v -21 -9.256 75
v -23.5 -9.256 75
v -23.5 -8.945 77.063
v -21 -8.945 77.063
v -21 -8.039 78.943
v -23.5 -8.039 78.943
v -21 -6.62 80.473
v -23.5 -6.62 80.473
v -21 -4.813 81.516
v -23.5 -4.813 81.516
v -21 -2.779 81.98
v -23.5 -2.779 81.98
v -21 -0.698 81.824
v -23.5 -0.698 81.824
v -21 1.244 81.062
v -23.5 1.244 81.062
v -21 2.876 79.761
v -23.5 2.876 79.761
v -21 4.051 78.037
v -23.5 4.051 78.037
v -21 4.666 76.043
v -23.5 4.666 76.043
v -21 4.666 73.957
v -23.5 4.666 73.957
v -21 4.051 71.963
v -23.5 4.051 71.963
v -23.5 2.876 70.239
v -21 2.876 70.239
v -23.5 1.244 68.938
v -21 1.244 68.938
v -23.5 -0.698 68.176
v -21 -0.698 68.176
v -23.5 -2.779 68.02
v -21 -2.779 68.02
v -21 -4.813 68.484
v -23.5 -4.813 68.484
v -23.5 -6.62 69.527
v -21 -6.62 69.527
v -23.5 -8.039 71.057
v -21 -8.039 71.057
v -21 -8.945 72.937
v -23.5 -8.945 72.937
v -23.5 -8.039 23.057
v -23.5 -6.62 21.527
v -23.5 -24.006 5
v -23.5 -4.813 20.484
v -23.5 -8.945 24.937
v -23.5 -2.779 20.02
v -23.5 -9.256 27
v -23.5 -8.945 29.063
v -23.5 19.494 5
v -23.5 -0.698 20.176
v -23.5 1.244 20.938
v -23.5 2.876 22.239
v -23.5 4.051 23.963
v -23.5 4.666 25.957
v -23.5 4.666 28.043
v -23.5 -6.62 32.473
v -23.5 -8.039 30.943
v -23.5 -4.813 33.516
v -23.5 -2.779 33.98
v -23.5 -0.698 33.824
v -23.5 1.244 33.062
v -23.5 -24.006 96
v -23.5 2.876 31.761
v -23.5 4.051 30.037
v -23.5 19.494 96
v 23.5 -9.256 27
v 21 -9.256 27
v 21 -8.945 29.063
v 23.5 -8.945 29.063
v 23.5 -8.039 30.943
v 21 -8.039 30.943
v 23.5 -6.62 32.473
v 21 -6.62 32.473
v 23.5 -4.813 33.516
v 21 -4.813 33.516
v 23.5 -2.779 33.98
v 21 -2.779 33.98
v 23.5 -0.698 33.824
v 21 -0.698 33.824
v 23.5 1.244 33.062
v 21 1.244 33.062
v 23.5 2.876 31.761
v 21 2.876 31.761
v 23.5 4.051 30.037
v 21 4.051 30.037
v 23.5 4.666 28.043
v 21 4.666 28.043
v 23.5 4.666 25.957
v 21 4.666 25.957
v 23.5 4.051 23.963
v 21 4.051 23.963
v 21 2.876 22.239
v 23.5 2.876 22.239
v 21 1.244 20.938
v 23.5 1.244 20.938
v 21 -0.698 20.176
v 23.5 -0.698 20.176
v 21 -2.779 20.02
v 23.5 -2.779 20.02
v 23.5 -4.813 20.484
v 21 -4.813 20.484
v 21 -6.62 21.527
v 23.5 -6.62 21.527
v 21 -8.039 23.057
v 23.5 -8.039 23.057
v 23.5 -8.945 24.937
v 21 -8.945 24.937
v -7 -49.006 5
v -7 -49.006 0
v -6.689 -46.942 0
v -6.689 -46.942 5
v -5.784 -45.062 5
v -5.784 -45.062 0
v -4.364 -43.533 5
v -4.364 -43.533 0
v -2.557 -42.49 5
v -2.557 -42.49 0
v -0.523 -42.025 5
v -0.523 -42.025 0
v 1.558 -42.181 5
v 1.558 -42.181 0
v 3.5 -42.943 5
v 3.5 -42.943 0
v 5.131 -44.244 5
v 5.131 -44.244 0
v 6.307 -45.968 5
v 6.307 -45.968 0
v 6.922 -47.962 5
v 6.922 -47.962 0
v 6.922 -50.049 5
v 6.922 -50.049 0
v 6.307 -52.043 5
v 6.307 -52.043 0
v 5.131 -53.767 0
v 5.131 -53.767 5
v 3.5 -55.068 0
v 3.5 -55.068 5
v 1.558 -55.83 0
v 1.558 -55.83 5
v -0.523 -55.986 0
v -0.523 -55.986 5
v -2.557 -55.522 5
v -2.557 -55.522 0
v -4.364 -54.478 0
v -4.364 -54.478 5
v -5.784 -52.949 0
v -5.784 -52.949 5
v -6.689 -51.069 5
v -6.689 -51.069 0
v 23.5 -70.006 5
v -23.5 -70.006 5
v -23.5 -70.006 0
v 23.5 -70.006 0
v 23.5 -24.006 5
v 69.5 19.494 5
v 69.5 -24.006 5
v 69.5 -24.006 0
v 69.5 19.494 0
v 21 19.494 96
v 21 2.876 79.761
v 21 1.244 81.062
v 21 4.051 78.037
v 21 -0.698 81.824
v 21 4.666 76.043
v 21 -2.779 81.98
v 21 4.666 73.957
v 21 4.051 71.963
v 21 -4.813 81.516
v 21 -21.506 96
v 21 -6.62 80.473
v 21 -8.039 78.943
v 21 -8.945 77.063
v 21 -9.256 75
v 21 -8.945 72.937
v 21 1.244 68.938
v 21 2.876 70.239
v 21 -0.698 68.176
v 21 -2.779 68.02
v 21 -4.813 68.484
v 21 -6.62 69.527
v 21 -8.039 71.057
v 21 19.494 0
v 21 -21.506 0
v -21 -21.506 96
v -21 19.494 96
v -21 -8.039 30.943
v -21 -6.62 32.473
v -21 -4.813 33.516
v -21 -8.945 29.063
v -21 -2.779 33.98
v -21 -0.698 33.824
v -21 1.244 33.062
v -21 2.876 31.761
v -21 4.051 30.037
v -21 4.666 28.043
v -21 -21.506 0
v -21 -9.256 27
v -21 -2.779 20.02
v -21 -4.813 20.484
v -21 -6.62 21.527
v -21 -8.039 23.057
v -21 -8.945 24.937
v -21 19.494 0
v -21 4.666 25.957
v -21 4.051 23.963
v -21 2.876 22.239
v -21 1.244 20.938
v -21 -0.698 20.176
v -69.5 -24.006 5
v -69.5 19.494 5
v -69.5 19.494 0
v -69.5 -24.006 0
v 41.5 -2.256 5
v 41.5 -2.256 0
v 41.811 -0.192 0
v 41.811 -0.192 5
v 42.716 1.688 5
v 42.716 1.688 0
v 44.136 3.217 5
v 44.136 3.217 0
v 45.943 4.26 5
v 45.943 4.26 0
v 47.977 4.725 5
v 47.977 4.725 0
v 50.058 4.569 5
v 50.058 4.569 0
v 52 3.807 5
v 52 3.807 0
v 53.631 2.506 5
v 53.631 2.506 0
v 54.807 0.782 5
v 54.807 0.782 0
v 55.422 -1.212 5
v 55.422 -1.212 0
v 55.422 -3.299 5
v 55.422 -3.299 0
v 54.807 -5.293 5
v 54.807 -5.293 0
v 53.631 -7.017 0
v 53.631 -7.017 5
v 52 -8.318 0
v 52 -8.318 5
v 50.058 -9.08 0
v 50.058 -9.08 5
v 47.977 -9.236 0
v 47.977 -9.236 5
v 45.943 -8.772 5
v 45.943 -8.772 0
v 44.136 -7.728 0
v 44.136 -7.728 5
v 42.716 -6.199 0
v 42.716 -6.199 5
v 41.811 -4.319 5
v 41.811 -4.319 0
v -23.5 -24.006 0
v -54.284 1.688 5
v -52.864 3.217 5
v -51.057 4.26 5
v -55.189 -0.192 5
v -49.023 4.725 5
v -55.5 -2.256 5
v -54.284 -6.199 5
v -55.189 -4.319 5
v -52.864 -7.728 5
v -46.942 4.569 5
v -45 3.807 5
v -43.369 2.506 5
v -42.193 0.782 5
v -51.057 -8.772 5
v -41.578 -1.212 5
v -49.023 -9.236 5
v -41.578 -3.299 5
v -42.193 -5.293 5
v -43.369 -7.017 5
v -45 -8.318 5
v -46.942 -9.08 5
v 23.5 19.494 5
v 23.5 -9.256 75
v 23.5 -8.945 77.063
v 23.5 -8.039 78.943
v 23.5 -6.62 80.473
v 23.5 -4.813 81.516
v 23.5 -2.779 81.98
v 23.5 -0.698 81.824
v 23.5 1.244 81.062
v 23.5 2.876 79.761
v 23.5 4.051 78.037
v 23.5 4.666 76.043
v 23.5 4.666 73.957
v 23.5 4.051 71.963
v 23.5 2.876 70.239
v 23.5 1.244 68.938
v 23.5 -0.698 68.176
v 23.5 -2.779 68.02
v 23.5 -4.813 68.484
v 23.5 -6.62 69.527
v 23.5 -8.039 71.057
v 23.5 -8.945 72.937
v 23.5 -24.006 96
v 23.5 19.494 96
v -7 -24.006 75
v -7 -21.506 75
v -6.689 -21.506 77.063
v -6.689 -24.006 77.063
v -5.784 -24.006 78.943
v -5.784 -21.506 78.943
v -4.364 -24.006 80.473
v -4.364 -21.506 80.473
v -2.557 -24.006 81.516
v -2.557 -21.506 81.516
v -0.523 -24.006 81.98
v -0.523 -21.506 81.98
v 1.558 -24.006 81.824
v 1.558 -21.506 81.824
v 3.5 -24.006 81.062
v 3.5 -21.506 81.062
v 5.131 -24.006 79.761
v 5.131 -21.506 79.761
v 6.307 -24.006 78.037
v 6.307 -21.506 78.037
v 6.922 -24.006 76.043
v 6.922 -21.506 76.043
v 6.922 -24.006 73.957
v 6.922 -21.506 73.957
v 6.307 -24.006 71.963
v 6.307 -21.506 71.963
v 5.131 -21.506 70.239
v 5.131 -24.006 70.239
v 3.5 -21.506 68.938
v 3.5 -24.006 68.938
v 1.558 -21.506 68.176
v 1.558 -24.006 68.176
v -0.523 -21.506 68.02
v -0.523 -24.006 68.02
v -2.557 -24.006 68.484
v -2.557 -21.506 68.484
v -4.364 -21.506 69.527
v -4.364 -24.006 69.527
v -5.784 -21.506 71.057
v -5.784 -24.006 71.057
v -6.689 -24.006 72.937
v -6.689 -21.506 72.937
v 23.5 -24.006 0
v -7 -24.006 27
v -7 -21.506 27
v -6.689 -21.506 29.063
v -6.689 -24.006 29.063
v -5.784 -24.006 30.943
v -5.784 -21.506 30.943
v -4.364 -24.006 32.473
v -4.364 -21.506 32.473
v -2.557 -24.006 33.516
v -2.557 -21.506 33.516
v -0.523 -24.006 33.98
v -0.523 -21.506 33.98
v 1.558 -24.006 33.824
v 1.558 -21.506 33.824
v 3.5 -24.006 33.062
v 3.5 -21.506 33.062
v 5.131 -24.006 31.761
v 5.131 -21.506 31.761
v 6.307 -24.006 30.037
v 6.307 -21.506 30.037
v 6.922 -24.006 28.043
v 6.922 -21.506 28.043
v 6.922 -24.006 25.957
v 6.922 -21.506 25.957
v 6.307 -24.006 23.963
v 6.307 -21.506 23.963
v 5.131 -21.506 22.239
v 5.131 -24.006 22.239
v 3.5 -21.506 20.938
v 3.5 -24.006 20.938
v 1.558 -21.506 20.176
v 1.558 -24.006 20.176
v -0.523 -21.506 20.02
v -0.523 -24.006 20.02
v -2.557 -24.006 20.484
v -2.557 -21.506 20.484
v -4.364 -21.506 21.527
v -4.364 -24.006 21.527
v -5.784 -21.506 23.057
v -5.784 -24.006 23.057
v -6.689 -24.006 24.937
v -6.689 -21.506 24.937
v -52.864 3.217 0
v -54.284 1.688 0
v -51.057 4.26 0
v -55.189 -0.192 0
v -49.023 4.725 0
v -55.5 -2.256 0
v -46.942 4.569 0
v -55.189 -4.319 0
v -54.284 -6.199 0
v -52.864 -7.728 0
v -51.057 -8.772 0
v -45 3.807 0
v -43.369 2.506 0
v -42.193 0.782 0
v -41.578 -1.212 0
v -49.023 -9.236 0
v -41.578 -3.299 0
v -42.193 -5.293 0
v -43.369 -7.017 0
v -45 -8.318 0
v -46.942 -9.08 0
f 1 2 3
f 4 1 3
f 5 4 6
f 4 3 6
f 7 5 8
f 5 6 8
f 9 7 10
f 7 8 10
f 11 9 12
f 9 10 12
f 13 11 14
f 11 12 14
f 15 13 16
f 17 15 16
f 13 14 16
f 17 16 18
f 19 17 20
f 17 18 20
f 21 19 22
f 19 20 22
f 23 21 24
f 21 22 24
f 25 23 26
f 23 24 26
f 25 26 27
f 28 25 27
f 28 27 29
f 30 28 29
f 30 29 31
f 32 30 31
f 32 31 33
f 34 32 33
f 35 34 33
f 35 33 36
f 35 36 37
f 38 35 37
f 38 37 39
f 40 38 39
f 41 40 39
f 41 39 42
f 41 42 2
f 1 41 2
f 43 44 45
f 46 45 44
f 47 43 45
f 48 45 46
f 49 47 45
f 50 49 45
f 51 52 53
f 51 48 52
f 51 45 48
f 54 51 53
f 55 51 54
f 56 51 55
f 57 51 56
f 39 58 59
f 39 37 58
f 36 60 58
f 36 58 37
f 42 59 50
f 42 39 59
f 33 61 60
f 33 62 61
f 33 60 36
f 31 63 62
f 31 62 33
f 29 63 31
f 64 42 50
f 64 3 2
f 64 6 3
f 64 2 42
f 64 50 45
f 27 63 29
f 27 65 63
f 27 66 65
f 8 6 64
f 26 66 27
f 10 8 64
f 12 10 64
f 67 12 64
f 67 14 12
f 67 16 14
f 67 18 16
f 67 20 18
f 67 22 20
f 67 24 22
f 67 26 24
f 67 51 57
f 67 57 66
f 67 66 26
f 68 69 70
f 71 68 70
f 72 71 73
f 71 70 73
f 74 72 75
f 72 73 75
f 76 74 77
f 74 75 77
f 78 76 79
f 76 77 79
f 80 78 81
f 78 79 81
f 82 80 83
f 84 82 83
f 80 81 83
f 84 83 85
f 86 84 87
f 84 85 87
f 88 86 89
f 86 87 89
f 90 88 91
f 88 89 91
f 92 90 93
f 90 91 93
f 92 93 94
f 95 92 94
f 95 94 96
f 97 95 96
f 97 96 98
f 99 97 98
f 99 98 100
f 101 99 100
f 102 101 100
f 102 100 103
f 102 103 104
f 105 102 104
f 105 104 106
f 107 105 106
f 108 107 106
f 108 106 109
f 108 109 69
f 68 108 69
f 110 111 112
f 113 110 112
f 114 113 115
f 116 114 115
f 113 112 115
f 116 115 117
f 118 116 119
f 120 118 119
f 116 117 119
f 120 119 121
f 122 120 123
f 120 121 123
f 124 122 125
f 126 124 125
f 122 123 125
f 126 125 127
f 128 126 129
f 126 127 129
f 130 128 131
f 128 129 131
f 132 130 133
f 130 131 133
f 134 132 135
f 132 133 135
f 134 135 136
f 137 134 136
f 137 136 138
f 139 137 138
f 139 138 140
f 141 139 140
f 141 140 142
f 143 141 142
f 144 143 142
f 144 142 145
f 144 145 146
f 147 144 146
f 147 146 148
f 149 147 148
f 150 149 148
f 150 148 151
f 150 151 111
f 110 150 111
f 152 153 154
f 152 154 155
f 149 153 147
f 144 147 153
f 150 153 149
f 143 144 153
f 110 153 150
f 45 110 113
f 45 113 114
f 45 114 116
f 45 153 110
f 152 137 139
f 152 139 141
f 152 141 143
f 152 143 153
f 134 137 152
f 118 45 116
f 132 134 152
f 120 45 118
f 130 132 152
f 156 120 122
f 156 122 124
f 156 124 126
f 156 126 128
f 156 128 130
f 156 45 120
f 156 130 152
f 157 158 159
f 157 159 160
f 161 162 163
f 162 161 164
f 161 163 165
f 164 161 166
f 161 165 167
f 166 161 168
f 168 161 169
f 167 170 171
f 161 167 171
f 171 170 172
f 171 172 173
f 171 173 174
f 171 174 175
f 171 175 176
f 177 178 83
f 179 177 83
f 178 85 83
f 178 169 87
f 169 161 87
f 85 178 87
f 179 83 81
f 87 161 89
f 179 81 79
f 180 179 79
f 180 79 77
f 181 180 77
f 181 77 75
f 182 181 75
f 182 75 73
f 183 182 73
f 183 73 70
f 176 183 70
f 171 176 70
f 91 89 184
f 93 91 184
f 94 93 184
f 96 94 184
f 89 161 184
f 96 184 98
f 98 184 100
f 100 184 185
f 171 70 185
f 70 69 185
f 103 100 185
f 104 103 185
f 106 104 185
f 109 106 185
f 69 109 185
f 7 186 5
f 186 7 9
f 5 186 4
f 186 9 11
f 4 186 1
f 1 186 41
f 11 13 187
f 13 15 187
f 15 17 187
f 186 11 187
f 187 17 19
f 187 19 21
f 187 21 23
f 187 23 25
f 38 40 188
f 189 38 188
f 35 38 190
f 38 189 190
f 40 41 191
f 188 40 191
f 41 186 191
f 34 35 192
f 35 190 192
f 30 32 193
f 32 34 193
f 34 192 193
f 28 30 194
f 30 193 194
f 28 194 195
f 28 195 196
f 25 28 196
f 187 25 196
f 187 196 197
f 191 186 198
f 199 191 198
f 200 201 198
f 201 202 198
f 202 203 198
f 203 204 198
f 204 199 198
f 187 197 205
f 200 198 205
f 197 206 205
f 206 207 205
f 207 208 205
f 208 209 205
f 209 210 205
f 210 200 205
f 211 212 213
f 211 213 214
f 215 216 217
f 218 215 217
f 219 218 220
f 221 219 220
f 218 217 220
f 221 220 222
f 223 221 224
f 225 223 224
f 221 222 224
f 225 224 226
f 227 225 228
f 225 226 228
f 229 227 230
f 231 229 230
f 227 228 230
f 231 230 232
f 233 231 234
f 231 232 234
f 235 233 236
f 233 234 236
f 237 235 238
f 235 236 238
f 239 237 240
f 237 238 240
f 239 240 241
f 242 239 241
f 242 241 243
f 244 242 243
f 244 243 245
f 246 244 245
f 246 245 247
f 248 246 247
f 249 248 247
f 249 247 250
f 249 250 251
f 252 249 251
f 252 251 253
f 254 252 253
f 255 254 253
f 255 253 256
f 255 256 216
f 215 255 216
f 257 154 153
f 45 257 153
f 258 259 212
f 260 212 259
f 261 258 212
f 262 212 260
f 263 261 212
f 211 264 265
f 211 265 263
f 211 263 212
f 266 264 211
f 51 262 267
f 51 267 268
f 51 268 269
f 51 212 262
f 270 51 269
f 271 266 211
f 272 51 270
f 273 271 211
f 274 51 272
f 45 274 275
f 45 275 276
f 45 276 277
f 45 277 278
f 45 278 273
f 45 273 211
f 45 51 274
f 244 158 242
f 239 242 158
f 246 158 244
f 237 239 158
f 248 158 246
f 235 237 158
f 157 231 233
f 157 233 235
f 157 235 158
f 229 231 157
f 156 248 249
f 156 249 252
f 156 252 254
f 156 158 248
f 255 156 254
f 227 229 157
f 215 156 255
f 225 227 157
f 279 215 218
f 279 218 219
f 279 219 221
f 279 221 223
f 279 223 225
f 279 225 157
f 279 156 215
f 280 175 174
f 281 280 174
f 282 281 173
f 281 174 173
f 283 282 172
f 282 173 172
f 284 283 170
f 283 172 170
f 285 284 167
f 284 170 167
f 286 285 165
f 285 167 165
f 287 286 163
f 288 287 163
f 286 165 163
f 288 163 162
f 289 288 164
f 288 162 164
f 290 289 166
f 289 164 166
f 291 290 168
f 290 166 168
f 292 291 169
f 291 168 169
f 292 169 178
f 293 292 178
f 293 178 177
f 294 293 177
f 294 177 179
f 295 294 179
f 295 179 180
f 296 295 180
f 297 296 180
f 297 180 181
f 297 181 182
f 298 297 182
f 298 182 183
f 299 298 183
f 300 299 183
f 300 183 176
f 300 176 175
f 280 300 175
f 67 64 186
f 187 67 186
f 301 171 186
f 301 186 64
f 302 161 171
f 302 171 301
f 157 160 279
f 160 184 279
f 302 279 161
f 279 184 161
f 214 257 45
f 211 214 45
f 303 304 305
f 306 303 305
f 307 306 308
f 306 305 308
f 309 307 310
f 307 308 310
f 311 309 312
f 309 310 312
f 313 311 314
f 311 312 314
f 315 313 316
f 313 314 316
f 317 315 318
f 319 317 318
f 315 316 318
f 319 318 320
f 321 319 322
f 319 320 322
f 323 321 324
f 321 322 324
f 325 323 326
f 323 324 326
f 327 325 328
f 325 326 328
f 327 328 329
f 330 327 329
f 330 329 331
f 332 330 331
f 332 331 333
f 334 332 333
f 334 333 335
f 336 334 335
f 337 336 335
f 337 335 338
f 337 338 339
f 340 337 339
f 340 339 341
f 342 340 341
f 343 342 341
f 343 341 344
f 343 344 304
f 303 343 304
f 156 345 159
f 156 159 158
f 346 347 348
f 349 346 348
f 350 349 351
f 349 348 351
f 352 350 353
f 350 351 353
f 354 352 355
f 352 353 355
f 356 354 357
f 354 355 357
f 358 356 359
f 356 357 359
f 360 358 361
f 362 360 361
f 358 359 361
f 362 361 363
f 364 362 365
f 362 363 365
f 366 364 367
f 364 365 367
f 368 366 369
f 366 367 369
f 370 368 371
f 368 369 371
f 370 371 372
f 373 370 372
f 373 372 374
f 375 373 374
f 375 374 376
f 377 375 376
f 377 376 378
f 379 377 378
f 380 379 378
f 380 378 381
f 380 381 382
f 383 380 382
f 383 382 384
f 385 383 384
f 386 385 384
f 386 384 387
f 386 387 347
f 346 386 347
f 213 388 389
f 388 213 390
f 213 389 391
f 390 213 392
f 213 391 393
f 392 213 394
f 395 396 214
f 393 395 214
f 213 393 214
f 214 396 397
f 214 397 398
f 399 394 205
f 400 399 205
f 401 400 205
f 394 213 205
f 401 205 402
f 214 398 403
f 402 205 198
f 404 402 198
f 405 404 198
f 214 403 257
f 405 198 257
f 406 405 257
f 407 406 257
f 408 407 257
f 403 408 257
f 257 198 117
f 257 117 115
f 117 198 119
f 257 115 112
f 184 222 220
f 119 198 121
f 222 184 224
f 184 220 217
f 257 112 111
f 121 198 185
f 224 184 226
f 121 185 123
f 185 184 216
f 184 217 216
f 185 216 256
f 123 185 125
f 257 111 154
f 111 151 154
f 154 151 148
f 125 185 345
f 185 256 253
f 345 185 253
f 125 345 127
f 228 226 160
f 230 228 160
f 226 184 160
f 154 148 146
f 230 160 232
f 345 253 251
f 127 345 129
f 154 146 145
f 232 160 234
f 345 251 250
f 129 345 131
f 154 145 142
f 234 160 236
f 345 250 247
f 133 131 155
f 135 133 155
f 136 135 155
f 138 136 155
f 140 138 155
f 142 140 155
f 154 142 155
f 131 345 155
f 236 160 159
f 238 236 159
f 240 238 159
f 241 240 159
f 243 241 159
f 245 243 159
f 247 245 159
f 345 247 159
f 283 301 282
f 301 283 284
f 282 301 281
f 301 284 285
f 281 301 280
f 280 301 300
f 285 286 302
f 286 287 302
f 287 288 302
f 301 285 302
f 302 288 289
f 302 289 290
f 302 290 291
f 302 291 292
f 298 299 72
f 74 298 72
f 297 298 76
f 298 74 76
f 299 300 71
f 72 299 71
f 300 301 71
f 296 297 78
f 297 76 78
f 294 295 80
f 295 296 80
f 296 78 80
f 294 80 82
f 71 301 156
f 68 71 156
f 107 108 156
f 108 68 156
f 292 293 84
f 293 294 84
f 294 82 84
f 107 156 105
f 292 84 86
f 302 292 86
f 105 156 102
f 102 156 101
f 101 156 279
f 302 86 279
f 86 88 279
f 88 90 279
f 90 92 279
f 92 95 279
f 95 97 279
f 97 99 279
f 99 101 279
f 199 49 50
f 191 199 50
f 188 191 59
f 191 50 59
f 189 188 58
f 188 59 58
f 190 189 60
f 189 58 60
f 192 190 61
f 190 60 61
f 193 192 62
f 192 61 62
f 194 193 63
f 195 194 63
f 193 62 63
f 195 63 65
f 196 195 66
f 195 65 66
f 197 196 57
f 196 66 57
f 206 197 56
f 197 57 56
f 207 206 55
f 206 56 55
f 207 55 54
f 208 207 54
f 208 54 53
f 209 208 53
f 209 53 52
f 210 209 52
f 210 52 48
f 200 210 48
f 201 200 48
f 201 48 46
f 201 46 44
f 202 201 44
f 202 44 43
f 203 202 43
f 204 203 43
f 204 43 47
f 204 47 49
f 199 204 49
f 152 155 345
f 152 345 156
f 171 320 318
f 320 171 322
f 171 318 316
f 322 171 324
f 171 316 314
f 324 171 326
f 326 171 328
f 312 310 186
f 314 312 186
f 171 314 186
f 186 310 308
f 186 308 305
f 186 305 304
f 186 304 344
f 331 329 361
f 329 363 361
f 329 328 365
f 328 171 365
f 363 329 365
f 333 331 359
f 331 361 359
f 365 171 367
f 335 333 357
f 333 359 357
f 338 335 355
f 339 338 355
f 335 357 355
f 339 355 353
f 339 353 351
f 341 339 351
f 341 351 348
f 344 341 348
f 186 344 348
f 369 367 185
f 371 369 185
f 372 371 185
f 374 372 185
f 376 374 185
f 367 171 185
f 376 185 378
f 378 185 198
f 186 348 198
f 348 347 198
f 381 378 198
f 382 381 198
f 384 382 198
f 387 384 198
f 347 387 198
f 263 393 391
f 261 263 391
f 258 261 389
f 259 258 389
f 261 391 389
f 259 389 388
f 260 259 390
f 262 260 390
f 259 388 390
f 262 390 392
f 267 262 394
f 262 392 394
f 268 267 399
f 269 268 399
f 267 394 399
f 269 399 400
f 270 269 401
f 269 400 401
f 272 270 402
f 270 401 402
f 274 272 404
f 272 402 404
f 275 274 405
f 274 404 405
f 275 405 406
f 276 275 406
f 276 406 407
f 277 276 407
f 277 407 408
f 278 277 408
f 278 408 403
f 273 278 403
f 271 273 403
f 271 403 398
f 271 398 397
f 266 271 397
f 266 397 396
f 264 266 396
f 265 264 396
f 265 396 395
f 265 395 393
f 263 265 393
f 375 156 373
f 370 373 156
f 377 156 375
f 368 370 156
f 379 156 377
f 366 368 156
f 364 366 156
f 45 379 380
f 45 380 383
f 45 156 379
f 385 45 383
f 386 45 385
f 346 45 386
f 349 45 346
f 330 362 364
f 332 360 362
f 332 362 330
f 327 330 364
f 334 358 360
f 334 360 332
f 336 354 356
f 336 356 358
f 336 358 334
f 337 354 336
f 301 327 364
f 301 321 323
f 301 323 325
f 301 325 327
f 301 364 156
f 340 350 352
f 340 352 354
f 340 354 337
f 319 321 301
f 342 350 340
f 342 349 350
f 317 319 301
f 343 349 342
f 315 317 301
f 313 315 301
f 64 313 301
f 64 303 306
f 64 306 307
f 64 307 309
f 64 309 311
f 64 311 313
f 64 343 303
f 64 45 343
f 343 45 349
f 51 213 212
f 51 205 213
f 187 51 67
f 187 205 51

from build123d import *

# Parameters (mm, degrees)
F1_DEPTH = 96
F2_W     = 43.5
F2_H     = 5
F3_DEPTH = 46
F4_W     = 47
F4_H     = 5
F5_DEPTH = 46
F6_W     = 43.5
F6_H     = 5
F7_DEPTH = 46
F9_D     = 14
F11_D    = 14
F13_D    = 14


with BuildPart() as f1:
    # F0 (on Top) → F1 (new body)
    with BuildSketch(Plane.XY):
        Polygon((-21, -21.505648), (-21, 19.494352), (-23.5, 19.494352), (-23.5, -24.005648), (23.5, -24.005648), (23.5, 19.494352), (21, 19.494352), (21, -21.505648), align=None)
    extrude(amount=F1_DEPTH)

    # F2 (on face) → F3 (join)
    with BuildSketch(Plane.YZ.offset(23.5)):
        with Locations((-2.255648, 2.5)):
            Rectangle(F2_W, F2_H)
    extrude(amount=F3_DEPTH)

    # F4 (on face) → F5 (join)
    with BuildSketch(Plane.XZ.offset(24.005648)):
        with Locations((0, 2.5)):
            Rectangle(F4_W, F4_H)
    extrude(amount=F5_DEPTH)

    # F6 (on face) → F7 (join)
    with BuildSketch(Plane(origin=(-23.5, 0, 0), x_dir=(0, -1, 0), z_dir=(-1, 0, 0))):
        with Locations((2.255648, 2.5)):
            Rectangle(F6_W, F6_H)
    extrude(amount=F7_DEPTH)

    # F9 (through all)
    with Locations(Plane.XY.offset(5)):
        with Locations((-48.5, -2.255648), (0, -49.005648), (48.5, -2.255648)):
            Hole(F9_D / 2)

    # F11 (through all)
    with Locations(Plane.XZ.offset(24.005648)):
        with Locations((0, 75), (0, 27)):
            Hole(F11_D / 2)

    # F13 (through all)
    with Locations(Plane.YZ.offset(23.5)):
        with Locations((-2.255648, 75), (-2.255648, 27)):
            Hole(F13_D / 2)


solid = f1.part
